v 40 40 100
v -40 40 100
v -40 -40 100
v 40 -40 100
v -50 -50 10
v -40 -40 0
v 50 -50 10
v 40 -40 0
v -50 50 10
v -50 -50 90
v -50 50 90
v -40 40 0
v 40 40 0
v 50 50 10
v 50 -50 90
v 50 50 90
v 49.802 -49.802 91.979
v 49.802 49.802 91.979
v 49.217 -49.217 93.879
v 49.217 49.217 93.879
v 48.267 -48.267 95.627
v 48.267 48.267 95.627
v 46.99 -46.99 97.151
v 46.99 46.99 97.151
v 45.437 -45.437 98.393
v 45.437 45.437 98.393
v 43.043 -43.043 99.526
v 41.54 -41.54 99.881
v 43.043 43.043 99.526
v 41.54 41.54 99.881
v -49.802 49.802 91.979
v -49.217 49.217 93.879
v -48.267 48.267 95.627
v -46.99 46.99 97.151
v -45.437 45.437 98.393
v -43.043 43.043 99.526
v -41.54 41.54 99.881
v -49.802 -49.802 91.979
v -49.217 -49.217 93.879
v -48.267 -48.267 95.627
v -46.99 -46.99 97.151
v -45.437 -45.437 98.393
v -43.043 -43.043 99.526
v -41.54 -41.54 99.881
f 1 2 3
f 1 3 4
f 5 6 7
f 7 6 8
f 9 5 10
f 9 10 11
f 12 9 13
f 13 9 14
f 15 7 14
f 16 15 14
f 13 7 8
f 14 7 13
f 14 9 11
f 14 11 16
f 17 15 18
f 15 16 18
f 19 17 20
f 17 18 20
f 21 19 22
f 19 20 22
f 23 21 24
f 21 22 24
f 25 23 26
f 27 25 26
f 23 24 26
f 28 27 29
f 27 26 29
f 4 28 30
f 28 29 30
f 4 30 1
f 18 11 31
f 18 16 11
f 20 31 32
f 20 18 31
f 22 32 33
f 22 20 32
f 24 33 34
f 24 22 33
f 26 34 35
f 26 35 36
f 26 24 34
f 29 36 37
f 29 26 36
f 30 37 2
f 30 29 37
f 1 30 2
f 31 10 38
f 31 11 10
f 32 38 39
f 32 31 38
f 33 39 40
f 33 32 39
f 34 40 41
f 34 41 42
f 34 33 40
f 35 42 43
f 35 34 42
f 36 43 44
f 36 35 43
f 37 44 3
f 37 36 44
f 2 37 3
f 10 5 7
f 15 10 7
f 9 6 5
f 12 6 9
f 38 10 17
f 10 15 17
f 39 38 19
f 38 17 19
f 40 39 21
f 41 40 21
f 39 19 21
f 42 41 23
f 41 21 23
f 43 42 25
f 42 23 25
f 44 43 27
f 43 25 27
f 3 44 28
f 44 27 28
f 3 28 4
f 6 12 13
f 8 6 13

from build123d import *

# Parameters (mm, degrees)
F0_W     = 100
F0_H     = 100
F1_DEPTH = 100
F2_R     = 10
F3_SIZE  = 10


with BuildPart() as f1:
    # F0 (on Top) → F1 (new body)
    with BuildSketch(Plane.XY):
        Rectangle(F0_W, F0_H)
    extrude(amount=F1_DEPTH)

    # F2
    f2_edges = [f1.edges().sort_by_distance(p)[0] for p in [
        (0, 50, 100),
        (-50, 0, 100),
        (0, -50, 100),
        (50, 0, 100),
    ]]
    fillet(f2_edges, radius=F2_R)

    # F3
    f3_edges = [f1.edges().sort_by_distance(p)[0] for p in [
        (0, 50, 0),
        (-50, 0, 0),
        (0, -50, 0),
        (50, 0, 0),
    ]]
    chamfer(f3_edges, length=F3_SIZE)


solid = f1.part
